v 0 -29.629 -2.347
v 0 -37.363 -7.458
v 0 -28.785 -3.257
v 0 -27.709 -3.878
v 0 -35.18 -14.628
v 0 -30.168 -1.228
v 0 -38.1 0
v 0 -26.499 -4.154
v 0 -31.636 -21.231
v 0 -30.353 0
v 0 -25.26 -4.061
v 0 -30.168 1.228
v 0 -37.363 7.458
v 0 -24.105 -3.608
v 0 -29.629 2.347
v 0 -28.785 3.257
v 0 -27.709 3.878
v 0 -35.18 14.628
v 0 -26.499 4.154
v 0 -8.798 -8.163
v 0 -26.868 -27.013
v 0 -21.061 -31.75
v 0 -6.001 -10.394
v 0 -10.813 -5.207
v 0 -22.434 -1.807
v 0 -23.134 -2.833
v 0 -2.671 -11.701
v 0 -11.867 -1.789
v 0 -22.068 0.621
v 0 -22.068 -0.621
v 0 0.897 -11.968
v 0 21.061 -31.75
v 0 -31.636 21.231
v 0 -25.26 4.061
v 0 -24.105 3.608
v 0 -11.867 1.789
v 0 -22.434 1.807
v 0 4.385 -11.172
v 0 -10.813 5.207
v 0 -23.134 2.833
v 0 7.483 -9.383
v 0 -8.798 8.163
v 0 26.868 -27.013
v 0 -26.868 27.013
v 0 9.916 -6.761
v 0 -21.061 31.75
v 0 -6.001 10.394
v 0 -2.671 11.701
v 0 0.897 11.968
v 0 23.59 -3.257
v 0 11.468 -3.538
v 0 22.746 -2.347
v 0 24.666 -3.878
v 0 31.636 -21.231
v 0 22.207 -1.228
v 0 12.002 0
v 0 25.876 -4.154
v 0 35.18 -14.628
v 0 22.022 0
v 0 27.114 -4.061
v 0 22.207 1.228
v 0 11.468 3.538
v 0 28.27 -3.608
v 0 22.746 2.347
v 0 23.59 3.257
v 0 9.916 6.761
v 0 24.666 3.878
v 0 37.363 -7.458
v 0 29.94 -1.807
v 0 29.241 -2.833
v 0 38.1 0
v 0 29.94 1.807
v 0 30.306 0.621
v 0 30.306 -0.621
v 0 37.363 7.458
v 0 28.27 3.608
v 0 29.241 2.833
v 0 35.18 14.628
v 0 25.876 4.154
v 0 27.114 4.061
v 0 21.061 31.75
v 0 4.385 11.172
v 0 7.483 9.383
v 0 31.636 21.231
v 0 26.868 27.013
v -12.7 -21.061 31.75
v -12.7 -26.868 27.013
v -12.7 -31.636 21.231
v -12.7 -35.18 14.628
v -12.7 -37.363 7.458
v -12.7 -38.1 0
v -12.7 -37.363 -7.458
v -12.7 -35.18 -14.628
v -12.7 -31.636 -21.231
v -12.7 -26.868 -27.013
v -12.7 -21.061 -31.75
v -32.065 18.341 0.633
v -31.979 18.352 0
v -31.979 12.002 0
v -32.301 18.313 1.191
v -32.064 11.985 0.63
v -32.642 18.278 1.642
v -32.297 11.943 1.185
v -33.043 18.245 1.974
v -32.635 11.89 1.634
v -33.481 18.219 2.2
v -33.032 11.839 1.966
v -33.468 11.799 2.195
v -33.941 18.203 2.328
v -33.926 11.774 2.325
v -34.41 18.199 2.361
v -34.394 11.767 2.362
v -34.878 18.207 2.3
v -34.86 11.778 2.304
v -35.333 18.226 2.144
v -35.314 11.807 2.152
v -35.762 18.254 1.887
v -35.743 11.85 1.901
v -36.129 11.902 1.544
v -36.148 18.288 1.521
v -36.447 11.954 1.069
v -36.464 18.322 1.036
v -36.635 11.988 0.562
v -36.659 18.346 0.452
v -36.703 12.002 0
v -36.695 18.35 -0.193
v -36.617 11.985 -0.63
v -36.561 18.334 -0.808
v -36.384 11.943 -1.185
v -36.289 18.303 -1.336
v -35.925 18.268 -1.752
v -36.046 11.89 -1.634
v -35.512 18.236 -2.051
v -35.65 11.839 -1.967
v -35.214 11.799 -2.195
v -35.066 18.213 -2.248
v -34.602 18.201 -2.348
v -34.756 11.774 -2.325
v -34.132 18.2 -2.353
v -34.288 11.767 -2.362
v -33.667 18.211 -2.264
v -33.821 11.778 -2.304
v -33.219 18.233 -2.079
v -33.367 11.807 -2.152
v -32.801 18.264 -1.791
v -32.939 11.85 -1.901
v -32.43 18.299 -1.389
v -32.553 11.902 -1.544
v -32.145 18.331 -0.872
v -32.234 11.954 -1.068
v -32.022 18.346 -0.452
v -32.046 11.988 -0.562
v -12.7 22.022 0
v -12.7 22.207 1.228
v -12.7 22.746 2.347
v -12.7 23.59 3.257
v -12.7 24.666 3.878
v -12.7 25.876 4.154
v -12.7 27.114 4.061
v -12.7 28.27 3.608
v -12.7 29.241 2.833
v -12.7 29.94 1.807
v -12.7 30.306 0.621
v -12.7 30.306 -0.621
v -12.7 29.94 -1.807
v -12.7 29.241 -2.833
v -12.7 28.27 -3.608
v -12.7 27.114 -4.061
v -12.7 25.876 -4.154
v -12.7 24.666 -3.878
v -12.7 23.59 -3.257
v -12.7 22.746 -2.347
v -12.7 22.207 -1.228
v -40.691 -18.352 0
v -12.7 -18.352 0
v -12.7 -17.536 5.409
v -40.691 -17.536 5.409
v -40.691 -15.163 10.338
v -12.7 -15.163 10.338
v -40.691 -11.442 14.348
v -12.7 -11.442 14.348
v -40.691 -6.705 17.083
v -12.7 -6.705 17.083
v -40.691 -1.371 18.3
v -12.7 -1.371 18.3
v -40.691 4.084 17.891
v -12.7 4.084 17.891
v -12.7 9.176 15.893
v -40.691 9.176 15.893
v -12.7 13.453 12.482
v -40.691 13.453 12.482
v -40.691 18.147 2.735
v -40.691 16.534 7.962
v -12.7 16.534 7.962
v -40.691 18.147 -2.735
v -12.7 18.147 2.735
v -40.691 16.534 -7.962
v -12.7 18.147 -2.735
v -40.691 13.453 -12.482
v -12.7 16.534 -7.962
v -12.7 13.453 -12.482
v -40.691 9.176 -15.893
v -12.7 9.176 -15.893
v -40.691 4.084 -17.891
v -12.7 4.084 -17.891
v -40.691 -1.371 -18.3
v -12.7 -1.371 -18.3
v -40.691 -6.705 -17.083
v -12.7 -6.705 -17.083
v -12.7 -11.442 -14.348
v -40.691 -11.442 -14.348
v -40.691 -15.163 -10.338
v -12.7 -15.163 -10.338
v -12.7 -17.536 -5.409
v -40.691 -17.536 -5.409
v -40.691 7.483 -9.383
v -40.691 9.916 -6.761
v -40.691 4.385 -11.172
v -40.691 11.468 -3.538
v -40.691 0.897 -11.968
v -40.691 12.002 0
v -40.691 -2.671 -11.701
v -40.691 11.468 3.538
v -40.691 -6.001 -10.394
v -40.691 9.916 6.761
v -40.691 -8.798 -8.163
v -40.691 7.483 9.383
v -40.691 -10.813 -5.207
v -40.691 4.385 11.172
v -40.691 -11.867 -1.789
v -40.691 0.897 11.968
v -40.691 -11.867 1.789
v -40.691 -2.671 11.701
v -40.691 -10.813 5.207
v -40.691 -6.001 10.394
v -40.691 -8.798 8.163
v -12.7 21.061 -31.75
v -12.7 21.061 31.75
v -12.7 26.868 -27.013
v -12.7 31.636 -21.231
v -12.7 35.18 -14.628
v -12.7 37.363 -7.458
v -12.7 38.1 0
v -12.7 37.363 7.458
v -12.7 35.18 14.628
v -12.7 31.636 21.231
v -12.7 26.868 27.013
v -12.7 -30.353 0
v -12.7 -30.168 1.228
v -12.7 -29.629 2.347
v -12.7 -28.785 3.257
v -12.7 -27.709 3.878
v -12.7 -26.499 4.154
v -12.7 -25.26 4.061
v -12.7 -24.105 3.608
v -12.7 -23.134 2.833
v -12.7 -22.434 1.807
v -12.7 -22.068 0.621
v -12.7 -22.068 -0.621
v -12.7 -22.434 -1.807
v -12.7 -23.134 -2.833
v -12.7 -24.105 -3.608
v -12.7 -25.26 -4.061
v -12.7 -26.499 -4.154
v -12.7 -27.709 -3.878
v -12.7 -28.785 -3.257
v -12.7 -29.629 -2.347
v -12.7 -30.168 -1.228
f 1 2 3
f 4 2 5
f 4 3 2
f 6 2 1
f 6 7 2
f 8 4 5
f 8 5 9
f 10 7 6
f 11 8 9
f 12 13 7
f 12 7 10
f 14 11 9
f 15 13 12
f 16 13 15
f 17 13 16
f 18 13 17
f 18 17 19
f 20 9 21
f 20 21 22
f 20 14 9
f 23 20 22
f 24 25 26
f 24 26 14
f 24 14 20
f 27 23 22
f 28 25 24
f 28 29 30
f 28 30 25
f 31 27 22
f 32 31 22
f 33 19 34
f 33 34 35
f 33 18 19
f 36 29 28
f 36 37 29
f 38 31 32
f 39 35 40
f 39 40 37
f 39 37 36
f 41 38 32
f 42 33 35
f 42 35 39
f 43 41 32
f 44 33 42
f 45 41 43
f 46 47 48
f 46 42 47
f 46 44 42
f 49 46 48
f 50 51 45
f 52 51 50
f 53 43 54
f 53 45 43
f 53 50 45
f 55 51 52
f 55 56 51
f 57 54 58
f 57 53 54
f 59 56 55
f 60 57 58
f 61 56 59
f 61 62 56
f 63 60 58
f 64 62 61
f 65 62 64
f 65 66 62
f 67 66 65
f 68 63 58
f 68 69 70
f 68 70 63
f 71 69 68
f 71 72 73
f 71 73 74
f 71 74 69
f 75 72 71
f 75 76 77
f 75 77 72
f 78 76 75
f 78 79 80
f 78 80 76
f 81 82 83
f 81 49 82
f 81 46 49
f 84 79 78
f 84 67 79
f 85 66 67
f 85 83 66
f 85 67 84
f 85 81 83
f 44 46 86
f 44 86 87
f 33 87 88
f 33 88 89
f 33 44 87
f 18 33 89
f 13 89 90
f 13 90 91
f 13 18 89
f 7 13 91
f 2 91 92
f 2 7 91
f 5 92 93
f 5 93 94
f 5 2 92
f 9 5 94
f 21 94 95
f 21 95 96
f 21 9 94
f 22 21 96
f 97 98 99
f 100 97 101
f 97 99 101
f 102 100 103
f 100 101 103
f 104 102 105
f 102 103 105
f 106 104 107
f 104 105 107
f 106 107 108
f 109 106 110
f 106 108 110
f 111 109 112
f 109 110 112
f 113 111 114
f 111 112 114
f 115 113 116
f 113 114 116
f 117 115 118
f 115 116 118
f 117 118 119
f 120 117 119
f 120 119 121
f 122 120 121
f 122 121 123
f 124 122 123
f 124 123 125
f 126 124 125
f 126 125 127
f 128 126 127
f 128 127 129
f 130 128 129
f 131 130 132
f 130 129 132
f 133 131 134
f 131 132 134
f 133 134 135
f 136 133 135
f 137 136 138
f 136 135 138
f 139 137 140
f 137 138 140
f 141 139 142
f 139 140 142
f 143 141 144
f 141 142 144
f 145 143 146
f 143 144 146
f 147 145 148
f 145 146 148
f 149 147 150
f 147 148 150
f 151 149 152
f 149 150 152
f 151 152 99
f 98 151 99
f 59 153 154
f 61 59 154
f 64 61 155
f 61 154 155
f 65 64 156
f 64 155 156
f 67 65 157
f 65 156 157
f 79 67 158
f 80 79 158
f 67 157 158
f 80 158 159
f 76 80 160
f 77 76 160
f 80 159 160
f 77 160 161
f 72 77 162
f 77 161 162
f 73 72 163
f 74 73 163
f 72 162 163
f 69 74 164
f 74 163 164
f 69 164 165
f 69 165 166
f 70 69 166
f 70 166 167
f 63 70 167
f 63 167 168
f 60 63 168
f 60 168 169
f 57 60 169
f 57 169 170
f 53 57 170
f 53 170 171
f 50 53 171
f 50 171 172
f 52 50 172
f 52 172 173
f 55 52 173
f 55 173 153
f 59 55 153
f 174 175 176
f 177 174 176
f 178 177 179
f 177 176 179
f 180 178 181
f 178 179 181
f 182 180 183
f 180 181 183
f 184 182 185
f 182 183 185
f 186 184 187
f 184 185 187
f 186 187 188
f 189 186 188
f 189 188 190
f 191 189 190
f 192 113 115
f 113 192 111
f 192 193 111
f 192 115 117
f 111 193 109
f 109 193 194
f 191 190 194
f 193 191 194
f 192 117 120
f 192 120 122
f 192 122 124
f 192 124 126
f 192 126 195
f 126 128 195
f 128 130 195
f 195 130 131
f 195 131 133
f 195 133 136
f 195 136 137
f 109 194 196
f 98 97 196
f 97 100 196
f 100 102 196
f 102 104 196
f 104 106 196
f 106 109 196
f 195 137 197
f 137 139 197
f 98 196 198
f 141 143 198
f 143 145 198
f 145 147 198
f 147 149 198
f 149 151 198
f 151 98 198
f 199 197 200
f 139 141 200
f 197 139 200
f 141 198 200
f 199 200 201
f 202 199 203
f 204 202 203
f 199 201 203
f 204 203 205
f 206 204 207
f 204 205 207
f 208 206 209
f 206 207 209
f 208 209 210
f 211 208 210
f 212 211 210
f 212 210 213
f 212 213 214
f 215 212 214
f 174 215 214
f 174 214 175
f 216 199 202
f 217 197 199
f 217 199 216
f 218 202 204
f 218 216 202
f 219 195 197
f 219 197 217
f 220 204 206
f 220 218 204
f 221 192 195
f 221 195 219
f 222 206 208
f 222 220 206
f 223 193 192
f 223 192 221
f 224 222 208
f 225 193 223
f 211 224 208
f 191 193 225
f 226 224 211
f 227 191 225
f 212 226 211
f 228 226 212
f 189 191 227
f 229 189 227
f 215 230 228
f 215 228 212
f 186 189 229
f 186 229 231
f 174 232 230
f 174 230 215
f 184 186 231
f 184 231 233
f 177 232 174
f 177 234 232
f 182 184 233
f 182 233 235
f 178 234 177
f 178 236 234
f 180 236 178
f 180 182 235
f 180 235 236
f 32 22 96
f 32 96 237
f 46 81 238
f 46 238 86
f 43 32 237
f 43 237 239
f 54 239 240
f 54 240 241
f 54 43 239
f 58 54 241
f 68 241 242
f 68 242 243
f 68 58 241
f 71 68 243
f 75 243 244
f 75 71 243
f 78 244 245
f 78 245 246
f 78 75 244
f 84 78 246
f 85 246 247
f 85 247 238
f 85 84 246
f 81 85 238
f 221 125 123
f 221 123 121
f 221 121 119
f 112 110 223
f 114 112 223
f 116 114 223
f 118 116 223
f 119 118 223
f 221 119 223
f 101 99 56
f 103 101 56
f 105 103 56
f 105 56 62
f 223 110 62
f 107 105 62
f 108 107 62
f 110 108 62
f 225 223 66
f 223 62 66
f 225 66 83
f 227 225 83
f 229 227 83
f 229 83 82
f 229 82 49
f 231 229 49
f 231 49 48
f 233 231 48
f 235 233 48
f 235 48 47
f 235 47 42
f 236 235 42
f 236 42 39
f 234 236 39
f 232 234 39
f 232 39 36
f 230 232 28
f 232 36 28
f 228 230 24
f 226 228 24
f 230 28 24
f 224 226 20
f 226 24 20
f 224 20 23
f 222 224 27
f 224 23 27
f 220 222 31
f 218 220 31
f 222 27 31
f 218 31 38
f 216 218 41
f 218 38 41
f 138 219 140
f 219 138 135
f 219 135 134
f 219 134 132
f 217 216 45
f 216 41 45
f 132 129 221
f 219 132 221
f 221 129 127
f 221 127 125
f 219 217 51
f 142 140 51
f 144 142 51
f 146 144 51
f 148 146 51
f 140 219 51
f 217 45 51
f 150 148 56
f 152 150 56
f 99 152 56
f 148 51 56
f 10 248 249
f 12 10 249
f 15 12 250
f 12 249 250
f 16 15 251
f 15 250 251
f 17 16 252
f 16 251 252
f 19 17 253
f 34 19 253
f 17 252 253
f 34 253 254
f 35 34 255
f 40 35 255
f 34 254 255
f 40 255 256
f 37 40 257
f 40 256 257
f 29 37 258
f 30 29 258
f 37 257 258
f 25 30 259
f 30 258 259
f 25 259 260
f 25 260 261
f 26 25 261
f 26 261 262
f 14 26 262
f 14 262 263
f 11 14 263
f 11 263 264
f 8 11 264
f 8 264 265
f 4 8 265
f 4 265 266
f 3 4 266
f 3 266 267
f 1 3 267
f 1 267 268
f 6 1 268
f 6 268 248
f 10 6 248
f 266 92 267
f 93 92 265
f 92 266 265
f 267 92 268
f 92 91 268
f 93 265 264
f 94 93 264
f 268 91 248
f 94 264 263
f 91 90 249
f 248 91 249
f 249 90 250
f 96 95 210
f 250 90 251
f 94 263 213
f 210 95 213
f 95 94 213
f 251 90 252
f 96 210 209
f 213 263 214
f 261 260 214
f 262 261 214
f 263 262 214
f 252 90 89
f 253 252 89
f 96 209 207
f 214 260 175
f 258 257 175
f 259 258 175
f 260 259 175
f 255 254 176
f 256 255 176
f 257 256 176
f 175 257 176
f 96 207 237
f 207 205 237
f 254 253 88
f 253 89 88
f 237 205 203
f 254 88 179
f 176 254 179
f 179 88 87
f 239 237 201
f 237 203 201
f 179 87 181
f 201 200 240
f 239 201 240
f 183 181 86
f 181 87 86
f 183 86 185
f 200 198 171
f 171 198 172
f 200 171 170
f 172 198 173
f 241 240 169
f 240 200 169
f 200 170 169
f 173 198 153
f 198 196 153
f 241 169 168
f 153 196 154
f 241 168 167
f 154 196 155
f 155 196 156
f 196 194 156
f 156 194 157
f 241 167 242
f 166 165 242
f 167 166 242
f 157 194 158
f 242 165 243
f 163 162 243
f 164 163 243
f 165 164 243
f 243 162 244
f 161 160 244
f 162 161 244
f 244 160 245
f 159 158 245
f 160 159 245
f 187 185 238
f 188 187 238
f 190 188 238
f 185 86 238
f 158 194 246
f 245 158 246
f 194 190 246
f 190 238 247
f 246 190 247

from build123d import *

# Parameters (mm, degrees)
F1_DEPTH = 12.7
F2_R     = 18.3515
F3_DEPTH = 27.9908
F4_R     = 12.0015
F5_DEPTH = 40.6918
F6_D     = 8.3312
F7_R     = 2.3622
F8_DEPTH = 25.4


with BuildPart() as f1:
    # F0 (on Right) → F1 (new body)
    with BuildSketch(Plane.YZ):
        with BuildLine():
            Line((21.060567, 31.75), (-21.060567, 31.75))
            ThreePointArc((-21.060567, 31.75), (-38.1, 0), (-21.060567, -31.75))
            Line((-21.060567, -31.75), (21.060567, -31.75))
            ThreePointArc((21.060567, -31.75), (38.1, 0), (21.060567, 31.75))
        make_face()
    extrude(amount=-F1_DEPTH)

    # F2 (on face) → F3 (join)
    with BuildSketch(Plane(origin=(-12.7, 0, 0), x_dir=(0, -1, 0), z_dir=(-1, 0, 0))):
        Circle(F2_R)
    extrude(amount=F3_DEPTH)

    # F4 (on face) → F5 (cut, through all)
    with BuildSketch(Plane.YZ):
        Circle(F4_R)
    extrude(amount=-F5_DEPTH, mode=Mode.SUBTRACT)

    # F6 (through all)
    with Locations(Plane.YZ):
        with Locations((26.1874, 0), (-26.1874, 0)):
            Hole(F6_D / 2)

    # F7 (on Front) → F8 (cut)
    with BuildSketch(Plane.XZ):
        with Locations((-34.3408, 0)):
            Circle(F7_R)
    extrude(amount=-F8_DEPTH, mode=Mode.SUBTRACT)


solid = f1.part
